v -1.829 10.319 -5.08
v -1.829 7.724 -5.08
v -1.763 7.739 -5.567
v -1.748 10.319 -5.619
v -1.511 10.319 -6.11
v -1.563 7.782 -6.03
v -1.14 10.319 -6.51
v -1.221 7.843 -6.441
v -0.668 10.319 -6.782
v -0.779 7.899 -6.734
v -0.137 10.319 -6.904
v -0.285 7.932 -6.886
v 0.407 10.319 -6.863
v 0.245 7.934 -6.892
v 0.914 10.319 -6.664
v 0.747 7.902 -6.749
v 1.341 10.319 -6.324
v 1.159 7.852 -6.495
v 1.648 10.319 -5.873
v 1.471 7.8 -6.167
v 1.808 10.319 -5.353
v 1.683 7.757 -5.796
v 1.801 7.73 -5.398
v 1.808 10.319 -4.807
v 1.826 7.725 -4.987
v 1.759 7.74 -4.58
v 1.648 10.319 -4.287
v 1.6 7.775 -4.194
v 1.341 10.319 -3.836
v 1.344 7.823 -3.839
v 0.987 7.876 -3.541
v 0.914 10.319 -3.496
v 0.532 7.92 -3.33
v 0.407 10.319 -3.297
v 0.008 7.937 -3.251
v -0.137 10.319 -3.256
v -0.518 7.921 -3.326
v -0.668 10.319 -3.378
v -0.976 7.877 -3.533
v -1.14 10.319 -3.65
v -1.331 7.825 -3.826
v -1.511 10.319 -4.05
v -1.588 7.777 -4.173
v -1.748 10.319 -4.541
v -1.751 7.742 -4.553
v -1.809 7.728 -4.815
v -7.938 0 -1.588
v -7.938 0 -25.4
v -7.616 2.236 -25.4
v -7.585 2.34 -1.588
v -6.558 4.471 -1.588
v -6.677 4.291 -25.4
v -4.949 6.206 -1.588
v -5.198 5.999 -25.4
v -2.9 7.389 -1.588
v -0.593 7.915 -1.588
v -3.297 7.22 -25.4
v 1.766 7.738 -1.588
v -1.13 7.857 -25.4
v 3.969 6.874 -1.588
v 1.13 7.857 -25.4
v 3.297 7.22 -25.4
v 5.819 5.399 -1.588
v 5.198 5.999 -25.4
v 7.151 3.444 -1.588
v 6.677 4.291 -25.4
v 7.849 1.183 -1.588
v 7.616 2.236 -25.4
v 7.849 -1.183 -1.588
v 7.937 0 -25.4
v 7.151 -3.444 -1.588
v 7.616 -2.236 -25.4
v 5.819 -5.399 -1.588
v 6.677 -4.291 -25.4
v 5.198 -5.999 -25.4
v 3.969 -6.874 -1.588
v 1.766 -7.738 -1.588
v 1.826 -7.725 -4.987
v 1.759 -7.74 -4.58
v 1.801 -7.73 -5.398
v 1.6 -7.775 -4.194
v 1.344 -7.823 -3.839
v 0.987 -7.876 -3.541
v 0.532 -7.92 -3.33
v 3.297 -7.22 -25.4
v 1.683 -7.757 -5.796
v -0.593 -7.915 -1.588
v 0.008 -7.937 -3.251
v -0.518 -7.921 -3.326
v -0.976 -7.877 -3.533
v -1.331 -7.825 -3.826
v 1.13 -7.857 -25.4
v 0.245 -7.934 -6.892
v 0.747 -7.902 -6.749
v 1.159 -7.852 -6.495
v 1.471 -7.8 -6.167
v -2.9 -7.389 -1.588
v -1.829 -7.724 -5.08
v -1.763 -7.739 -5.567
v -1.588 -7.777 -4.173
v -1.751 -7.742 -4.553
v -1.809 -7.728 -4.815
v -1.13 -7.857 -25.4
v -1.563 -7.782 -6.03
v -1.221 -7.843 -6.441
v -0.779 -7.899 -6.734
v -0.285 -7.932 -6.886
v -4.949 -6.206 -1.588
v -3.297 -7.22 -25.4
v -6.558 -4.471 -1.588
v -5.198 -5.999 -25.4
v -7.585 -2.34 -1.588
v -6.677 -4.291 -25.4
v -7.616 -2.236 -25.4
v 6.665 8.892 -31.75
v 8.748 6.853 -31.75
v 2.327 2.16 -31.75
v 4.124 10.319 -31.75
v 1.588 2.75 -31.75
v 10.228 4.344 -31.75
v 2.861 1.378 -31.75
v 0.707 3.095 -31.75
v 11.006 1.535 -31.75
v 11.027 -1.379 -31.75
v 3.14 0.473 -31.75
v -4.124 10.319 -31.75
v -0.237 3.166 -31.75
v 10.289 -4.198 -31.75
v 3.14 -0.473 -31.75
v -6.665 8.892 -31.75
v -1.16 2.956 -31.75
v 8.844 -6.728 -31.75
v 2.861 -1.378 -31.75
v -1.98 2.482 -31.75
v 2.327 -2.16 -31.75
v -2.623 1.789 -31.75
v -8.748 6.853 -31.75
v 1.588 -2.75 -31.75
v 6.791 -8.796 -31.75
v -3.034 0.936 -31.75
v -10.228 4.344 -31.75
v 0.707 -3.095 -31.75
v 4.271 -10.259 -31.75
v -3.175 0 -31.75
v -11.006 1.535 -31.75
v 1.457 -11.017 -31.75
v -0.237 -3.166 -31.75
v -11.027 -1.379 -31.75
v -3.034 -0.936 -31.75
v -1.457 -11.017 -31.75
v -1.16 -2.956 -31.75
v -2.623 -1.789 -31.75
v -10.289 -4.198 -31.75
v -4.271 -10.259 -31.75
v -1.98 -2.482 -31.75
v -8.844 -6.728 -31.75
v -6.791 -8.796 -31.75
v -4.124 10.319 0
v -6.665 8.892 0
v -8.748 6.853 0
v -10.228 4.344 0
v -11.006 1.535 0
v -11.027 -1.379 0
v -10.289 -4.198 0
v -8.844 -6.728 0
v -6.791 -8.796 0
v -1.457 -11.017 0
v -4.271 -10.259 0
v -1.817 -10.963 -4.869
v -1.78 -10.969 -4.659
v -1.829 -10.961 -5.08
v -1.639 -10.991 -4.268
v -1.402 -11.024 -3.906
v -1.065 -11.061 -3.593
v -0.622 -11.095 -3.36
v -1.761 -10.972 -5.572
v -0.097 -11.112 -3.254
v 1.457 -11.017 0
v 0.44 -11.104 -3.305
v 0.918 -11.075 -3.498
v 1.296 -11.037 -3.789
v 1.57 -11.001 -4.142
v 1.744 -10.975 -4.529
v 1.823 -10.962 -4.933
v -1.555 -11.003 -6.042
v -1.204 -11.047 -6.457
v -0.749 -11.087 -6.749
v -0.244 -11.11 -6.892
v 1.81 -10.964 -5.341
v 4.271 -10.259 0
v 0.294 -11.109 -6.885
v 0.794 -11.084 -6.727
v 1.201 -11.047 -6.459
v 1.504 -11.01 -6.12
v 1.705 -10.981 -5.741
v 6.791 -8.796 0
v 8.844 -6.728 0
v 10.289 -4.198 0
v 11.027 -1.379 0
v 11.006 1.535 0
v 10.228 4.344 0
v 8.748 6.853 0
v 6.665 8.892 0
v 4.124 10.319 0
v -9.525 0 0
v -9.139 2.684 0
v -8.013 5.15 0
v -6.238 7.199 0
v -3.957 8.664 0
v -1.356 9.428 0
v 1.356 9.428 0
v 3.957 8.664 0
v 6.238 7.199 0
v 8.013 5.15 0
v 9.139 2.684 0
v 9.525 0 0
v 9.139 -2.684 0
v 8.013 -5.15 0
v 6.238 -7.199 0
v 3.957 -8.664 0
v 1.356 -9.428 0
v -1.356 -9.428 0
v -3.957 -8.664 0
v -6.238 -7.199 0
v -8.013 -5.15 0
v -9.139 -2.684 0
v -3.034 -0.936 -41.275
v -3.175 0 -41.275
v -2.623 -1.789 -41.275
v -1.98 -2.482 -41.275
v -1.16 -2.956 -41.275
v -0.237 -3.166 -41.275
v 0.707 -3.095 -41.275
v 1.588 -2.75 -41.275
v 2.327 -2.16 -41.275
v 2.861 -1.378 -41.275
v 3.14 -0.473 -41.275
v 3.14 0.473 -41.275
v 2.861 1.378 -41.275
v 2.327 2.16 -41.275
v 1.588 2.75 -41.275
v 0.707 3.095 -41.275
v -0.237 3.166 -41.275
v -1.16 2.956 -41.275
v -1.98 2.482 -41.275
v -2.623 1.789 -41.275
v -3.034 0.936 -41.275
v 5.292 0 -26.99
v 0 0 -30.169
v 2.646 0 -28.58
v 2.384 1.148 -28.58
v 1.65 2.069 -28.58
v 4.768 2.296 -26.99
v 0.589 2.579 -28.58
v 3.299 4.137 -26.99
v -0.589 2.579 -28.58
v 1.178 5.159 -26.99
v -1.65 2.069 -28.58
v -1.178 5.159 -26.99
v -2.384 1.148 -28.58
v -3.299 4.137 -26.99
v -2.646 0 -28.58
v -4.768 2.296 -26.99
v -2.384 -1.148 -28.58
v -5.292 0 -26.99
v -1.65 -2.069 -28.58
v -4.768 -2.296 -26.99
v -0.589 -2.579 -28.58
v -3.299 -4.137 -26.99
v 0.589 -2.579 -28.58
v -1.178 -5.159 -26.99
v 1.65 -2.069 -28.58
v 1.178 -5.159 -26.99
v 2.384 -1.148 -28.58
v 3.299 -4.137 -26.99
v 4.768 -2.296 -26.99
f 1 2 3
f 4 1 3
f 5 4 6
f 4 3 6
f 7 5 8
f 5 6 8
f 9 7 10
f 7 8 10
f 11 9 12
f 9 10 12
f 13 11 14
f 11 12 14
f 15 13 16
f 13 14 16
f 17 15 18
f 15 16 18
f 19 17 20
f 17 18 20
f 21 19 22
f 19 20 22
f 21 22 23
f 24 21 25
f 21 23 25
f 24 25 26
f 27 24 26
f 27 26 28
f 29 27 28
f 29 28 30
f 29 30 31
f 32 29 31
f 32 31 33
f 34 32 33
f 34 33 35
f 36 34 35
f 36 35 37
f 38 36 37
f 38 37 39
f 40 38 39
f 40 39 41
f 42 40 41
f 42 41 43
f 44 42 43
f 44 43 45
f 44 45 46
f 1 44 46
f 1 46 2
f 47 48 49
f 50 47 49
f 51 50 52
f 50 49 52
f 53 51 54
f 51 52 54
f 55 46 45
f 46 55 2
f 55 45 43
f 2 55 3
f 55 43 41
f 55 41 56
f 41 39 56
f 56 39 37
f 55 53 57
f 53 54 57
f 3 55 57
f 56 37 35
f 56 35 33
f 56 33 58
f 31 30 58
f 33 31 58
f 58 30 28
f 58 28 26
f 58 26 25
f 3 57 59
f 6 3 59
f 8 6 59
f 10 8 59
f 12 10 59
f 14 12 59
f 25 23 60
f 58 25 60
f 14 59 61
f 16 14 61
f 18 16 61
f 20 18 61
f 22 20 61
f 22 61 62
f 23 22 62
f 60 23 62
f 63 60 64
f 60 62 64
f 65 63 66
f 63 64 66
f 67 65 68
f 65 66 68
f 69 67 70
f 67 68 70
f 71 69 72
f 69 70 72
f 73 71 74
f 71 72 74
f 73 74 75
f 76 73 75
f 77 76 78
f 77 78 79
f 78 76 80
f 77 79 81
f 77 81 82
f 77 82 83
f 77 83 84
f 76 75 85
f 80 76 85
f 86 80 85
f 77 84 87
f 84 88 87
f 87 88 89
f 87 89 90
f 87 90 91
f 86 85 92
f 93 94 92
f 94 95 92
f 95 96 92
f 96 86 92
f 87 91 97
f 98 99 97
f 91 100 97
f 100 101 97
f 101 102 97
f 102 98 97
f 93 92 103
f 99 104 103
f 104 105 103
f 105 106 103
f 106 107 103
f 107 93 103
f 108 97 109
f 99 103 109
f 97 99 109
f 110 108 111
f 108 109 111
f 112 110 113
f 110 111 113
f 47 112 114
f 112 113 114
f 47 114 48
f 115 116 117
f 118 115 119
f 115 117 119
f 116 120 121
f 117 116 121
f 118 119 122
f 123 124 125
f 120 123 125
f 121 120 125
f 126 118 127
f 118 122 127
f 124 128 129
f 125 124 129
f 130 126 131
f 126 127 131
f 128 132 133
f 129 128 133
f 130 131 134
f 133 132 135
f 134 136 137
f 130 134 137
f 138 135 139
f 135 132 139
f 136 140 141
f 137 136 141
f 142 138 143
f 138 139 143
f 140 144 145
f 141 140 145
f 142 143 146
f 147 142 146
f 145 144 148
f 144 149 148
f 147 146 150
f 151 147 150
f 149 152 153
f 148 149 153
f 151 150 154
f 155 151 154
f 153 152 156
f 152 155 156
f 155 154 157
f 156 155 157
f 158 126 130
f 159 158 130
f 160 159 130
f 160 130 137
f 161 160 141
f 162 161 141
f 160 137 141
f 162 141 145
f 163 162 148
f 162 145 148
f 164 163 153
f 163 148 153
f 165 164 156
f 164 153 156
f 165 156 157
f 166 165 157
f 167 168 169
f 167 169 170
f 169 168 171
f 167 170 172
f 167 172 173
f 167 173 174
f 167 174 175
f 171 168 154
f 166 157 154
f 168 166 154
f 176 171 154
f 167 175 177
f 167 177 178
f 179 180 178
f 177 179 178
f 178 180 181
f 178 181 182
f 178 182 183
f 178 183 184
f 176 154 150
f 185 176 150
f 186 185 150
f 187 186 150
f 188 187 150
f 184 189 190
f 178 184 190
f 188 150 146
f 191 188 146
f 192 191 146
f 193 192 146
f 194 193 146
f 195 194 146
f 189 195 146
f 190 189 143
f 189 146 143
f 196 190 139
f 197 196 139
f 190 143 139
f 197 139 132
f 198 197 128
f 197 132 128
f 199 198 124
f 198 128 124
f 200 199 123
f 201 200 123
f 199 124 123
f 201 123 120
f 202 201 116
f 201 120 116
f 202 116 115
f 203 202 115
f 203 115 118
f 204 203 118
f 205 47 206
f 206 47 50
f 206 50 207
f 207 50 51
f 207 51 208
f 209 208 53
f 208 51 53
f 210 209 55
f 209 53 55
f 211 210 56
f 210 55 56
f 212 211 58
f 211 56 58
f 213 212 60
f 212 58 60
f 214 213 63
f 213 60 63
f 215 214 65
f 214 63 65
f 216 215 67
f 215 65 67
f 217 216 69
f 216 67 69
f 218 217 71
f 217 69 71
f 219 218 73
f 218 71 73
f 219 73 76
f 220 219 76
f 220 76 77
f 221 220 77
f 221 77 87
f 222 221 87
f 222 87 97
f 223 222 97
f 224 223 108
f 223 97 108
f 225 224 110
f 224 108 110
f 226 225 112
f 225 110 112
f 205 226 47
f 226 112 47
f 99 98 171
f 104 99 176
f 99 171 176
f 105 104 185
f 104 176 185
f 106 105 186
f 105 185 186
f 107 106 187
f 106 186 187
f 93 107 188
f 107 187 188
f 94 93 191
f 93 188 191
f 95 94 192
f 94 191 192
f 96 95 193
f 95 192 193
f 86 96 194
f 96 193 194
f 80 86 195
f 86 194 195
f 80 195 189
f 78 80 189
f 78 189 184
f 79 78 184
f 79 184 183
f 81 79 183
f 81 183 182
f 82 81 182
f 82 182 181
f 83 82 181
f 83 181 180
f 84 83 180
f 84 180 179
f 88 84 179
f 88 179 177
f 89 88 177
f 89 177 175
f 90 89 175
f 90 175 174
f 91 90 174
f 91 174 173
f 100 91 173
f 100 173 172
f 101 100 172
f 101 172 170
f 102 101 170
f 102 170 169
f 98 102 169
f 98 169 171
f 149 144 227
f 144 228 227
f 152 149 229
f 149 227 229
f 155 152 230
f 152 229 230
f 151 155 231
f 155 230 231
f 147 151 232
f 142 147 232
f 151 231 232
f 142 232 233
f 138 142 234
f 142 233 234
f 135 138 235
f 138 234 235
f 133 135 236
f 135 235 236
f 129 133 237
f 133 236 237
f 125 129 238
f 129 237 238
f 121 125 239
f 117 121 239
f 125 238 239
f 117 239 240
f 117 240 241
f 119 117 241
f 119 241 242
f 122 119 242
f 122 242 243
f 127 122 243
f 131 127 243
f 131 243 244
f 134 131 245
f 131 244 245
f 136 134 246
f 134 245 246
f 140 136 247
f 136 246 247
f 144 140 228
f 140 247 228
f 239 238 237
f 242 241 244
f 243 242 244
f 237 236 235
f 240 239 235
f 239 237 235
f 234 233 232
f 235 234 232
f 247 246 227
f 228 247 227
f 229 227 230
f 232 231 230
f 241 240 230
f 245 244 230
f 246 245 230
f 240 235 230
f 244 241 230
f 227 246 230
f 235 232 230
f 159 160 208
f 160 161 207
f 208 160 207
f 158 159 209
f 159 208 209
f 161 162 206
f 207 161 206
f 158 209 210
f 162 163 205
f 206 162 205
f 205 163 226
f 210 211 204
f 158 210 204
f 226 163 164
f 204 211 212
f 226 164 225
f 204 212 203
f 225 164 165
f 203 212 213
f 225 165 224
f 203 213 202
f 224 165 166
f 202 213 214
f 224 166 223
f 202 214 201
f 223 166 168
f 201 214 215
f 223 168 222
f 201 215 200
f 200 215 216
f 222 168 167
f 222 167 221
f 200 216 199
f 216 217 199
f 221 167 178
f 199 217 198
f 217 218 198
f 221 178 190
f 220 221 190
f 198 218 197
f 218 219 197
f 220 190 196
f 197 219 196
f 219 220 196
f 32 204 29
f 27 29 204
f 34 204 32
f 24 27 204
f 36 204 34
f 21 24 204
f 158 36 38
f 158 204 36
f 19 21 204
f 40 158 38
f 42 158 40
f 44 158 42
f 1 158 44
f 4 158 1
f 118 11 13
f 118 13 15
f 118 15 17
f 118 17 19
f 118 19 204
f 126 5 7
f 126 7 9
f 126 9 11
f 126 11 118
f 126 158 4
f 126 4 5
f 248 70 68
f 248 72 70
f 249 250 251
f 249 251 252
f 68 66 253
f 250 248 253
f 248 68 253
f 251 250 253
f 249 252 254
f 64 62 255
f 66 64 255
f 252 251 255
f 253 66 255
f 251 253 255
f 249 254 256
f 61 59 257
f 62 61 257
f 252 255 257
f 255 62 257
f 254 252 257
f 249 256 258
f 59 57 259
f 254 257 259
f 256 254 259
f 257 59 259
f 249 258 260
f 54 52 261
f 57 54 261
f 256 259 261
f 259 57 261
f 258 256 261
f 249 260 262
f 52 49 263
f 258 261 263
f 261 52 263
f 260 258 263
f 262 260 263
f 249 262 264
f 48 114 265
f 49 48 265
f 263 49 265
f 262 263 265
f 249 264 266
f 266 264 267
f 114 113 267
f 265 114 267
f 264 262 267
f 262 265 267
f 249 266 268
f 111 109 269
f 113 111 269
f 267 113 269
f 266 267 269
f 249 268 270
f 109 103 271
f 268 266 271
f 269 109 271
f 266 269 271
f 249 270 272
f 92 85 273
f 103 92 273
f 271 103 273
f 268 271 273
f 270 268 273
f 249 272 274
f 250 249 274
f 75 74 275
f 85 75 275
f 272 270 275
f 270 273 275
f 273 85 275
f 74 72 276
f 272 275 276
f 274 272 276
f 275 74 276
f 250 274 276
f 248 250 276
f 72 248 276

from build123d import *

# Parameters (mm, degrees)
F_5_8_0_625_DIAMETER_HOLE1_D     = 15.875
F_5_8_0_625_DIAMETER_HOLE1_DEPTH = 25.4
F_5_8_0_625_DIAMETER_HOLE1_TIP   = 4.769331164
CUT_EXTRUDE1_DEPTH               = 45.165608085
CUT_EXTRUDE1_DEPTH_BACK          = 45.165608085
SKETCH3_W                        = 31.75
SKETCH3_H                        = 0.79375
F_6_CLEARANCE_HOLE1_D            = 3.6576
CHAMFER1_SIZE                    = 1.5875


with BuildPart() as part:
    # Sketch1 → Revolve1 (revolve)
    with BuildSketch(Plane(origin=(0, 0, 0), x_dir=(1, 0, 0), z_dir=(0, 1, 0)), mode=Mode.PRIVATE) as revolve1_sk:
        Polygon((0, 0), (7.9375, 0), (11.1125, 0), (11.1125, 31.75), (3.175, 31.75), (3.175, 41.275), (0, 41.275), (0, 25.4), align=None)
    revolve(revolve1_sk.sketch.rotate(Axis((0, 0, -25.4), (0, 0, 1)), 180), axis=Axis((0, 0, -25.4), (0, 0, 1)))

    # 5/8 (0.625) Diameter Hole1
    with Locations(Plane.XY):
        with Locations((0, 0)):
            Hole(F_5_8_0_625_DIAMETER_HOLE1_D / 2, depth=F_5_8_0_625_DIAMETER_HOLE1_DEPTH)
            with Locations((0, 0, -(F_5_8_0_625_DIAMETER_HOLE1_DEPTH + F_5_8_0_625_DIAMETER_HOLE1_TIP / 2))):  # 118° drill point
                Cone(0, F_5_8_0_625_DIAMETER_HOLE1_D / 2, F_5_8_0_625_DIAMETER_HOLE1_TIP, mode=Mode.SUBTRACT)

    # Sketch3 → Cut-Extrude1 (cut, two sides: drawn at the far end of the back side and taken through both)
    with BuildSketch(Plane(origin=(0, 0, 0), x_dir=(0, 0, -1), z_dir=(1, 0, 0)).offset(-CUT_EXTRUDE1_DEPTH_BACK)):
        with Locations((15.875, 10.715625)):
            Rectangle(SKETCH3_W, SKETCH3_H)
    extrude(amount=CUT_EXTRUDE1_DEPTH + CUT_EXTRUDE1_DEPTH_BACK, mode=Mode.SUBTRACT)

    # #6 Clearance Hole1 (through all)
    with Locations(Plane(origin=(0, 10.31875, 0), x_dir=(1, 0, 0), z_dir=(0, 1, 0))):
        with Locations((0, 5.08)):
            Hole(F_6_CLEARANCE_HOLE1_D / 2)

    # Chamfer1
    chamfer1_edges = [part.edges().sort_by_distance(p)[0] for p in [
        (7.9375, 0, 0),
    ]]
    chamfer(chamfer1_edges, length=CHAMFER1_SIZE)


solid = part.part
